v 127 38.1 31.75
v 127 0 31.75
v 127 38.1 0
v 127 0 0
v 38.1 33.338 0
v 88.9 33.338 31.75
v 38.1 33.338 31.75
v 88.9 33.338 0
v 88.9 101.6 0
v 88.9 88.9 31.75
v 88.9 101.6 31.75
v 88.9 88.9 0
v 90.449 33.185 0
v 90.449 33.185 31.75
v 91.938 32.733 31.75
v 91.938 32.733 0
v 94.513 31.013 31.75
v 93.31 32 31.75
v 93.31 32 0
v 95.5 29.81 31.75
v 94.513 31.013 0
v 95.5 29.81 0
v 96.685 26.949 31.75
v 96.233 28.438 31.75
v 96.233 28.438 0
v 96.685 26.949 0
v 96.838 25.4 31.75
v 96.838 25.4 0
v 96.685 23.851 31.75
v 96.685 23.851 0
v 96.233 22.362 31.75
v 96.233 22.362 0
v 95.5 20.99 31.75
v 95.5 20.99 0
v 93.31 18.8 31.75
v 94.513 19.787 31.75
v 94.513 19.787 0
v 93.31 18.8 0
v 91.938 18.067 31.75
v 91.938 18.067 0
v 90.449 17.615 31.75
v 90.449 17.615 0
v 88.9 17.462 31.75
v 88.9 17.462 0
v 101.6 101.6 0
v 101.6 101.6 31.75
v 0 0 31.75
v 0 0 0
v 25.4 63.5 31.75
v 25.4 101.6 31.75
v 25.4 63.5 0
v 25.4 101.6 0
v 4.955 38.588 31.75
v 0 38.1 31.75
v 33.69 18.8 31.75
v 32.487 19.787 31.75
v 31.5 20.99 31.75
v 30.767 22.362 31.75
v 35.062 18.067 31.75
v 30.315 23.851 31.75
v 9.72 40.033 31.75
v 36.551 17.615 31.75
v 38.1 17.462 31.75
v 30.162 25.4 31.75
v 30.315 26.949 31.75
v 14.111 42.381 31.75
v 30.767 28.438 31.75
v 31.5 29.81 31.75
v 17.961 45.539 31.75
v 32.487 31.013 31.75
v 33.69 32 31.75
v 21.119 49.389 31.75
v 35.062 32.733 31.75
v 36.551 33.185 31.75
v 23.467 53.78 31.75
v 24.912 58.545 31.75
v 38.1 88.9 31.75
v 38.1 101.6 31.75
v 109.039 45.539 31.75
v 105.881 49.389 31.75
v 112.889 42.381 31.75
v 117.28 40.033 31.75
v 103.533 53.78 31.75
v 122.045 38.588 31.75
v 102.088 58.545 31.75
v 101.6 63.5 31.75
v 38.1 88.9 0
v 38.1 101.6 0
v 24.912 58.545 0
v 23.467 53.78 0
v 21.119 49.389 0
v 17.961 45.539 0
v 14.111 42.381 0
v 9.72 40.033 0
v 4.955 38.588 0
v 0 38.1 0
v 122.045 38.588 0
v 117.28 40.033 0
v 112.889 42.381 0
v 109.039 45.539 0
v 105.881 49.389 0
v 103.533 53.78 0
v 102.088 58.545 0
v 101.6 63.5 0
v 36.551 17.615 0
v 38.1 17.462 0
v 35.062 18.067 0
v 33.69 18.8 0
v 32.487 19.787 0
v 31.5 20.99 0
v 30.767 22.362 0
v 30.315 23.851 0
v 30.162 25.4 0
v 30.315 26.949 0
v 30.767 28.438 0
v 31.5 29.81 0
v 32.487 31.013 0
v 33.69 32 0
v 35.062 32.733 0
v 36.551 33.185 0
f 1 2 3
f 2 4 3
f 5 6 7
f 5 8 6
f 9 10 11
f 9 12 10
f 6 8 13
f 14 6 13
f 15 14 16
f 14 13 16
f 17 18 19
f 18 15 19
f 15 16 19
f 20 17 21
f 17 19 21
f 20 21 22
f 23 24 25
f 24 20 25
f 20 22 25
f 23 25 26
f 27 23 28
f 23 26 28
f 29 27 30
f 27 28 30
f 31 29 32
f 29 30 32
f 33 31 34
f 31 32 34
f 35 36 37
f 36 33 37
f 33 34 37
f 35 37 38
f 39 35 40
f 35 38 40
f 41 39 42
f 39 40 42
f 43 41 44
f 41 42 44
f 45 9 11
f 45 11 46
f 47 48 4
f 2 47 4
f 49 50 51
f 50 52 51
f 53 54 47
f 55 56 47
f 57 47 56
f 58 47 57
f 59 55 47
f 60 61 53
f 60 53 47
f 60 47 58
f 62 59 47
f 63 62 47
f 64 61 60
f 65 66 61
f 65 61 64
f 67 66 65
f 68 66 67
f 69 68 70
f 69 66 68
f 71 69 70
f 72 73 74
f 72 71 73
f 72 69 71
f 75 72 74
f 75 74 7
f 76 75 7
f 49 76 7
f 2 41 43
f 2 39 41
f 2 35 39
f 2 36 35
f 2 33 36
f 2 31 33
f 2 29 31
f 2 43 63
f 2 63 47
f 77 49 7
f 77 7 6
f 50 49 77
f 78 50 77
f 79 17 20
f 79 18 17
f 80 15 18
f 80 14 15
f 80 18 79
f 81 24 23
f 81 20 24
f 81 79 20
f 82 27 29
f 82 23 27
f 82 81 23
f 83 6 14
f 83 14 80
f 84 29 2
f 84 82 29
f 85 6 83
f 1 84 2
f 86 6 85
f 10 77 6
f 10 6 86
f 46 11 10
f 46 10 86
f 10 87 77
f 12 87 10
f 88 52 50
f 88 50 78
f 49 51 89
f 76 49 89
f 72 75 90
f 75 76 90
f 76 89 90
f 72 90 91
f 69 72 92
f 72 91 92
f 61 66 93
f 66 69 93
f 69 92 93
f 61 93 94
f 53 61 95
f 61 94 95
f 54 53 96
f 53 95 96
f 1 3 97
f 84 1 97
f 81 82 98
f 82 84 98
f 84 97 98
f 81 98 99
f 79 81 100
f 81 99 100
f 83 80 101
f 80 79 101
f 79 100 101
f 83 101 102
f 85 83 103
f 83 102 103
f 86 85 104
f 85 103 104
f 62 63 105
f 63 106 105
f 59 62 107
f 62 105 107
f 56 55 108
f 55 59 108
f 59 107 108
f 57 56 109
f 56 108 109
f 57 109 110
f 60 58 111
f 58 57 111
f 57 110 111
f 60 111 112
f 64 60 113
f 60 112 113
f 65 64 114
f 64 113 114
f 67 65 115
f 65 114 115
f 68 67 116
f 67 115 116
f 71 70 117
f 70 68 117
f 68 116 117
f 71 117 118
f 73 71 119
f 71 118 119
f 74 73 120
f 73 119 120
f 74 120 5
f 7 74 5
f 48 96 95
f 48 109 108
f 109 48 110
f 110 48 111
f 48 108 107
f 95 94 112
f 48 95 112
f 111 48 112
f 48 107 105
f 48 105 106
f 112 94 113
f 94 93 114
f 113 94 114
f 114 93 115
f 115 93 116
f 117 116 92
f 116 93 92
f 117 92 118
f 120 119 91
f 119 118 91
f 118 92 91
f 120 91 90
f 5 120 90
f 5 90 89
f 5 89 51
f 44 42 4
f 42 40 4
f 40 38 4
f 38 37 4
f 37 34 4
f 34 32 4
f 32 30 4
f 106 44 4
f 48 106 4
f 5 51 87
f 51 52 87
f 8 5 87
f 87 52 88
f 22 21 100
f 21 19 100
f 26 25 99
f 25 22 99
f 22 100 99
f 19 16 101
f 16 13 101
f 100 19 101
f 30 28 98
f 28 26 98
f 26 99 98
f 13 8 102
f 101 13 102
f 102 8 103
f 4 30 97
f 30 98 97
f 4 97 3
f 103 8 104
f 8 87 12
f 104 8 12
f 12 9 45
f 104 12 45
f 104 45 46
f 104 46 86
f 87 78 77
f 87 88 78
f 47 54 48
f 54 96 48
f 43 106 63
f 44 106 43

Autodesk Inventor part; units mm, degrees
ref_plane "YZ Plane" through (0, 0, 0) normal (1, 0, 0) x (0, 1, 0)
ref_plane "XZ Plane" through (0, 0, 0) normal (0, 1, 0) x (-1, 0, 0)
ref_plane "XY Plane" through (0, 0, 0) normal (0, 0, 1) x (1, 0, 0)
sketch "Sketch1" plane through (0, 0, 0) normal (0, 0, 1) x (1, 0, 0)
  line L0 (0, 38.1) -> (0, 0)
  line L1 (0, 0) -> (127, 0)
  line L2 (127, 0) -> (127, 38.1)
  arc A0 (0, 38.1) -> (25.4, 63.5) centre (0, 63.5) ccw
  arc A1 (101.6, 63.5) -> (127, 38.1) centre (127, 63.5) ccw
  line L3 (25.4, 101.6) -> (25.4, 63.5)
  line L4 (25.4, 101.6) -> (38.1, 101.6)
  line L5 (38.1, 101.6) -> (38.1, 88.9)
  line L6 (38.1, 88.9) -> (88.9, 88.9)
  line L7 (88.9, 88.9) -> (88.9, 101.6)
  line L8 (88.9, 101.6) -> (101.6, 101.6)
  line L9 (101.6, 101.6) -> (101.6, 63.5)
  arc A2 (38.1, 33.3375) -> (38.1, 17.4625) centre (38.1, 25.4) ccw
  arc A3 (88.9, 17.4625) -> (88.9, 33.3375) centre (88.9, 25.4) ccw
  line L10 (88.9, 33.3375) -> (38.1, 33.3375)
  line L11 (38.1, 17.4625) -> (88.9, 17.4625)
extrude "Extrusion1" add sketch "Sketch1" along normal blind 31.75
properties part number "P2-5"
